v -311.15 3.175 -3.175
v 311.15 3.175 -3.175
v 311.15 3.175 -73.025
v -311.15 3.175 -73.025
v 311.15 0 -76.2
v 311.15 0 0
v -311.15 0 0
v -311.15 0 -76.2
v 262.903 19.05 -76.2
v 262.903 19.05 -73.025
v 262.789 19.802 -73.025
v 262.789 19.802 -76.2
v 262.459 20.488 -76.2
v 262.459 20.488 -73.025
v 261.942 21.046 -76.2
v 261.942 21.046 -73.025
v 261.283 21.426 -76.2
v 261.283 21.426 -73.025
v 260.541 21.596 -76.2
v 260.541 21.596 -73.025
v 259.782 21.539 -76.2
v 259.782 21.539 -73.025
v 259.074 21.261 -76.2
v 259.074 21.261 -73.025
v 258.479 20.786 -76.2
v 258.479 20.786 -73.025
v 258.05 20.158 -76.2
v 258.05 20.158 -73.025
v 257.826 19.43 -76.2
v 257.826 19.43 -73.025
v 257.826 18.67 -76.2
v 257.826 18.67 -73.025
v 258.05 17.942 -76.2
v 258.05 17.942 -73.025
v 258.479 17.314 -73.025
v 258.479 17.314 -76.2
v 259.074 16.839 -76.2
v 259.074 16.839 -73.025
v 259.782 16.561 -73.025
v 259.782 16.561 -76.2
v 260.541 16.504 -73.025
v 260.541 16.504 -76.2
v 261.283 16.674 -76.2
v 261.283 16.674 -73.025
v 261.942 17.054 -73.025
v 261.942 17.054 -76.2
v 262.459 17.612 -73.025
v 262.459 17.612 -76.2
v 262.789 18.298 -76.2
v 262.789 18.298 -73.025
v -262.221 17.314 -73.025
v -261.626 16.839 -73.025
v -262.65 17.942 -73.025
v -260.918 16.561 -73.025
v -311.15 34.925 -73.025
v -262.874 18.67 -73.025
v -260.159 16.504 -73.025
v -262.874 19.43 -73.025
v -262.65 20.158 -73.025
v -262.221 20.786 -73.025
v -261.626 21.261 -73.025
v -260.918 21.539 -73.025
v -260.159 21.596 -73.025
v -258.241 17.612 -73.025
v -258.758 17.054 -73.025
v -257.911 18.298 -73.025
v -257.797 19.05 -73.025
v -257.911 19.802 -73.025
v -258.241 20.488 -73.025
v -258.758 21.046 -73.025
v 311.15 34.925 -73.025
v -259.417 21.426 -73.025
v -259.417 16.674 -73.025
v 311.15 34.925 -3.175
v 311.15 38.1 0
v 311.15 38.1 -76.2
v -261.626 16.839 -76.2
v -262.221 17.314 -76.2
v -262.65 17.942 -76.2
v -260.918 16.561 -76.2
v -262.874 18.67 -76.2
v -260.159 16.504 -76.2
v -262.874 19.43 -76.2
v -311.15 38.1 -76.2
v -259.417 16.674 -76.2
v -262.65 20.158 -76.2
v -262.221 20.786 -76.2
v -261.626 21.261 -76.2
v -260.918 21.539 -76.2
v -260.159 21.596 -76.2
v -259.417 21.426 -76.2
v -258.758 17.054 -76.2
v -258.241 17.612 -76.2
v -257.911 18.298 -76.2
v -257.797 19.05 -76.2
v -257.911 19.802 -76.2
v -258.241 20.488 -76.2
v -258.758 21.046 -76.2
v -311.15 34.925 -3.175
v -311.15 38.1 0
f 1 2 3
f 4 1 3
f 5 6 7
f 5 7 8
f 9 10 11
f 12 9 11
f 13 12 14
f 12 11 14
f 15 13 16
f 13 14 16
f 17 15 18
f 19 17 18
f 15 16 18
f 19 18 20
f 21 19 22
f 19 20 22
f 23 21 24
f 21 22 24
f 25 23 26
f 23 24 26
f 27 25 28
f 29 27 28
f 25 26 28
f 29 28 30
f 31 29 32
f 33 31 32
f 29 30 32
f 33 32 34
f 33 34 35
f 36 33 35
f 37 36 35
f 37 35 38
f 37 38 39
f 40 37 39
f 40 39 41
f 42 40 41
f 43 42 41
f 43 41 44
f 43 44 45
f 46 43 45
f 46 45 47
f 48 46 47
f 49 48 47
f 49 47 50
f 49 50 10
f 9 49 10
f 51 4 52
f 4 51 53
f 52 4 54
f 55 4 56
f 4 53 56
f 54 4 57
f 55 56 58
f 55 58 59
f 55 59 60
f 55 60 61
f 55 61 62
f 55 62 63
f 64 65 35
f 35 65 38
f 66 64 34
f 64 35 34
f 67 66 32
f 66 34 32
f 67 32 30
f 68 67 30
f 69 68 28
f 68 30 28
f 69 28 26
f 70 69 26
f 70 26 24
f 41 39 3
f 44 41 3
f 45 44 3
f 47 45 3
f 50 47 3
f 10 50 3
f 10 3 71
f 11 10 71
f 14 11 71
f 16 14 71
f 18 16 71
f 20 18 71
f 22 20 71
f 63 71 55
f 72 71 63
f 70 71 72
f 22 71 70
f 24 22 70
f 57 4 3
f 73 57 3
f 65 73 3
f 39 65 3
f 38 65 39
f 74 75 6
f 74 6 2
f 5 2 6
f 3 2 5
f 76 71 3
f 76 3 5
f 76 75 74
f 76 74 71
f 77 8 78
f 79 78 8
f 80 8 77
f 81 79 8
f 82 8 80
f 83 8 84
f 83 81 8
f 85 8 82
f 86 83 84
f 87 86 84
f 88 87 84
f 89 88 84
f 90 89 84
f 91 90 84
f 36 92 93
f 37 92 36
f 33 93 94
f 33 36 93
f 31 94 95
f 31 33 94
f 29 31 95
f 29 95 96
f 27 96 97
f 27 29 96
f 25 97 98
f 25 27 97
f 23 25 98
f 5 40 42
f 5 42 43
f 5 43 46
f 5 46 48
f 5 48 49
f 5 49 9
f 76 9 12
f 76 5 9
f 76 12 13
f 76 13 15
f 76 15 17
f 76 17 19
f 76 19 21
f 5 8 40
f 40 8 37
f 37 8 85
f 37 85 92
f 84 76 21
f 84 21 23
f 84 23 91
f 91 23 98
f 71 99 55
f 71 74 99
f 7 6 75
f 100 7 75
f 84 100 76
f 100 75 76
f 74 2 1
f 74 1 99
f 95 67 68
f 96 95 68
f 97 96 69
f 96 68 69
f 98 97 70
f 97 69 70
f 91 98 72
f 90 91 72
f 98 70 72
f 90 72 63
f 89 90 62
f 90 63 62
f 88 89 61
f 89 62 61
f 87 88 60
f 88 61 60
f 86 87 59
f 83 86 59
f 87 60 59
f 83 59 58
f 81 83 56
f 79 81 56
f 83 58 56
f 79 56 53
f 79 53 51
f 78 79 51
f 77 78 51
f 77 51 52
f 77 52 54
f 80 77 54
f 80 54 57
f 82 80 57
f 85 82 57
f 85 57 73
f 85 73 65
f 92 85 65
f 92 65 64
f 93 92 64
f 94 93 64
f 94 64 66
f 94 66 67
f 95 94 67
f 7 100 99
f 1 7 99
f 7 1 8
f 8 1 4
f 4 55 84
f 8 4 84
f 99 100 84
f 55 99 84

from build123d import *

# Parameters (mm, degrees)
SKETCH1_W                   = 76.2
SKETCH1_H                   = 38.1
SKETCH1_W_2                 = 69.85
SKETCH1_H_2                 = 31.75
BOSS_EXTRUDE1_DEPTH         = 311.15
F_1_4_20_TAPPED_HOLE1_D     = 5.1054
F_1_4_20_TAPPED_HOLE1_DEPTH = 3.175


with BuildPart() as part:
    # Sketch1 → Boss-Extrude1 (new body, symmetric)
    with BuildSketch(Plane(origin=(0, 0, 0), x_dir=(0, 0, -1), z_dir=(1, 0, 0))):
        with Locations((38.1, 19.05)):
            Rectangle(SKETCH1_W, SKETCH1_H)
        with Locations((38.1, 19.05)):
            Rectangle(SKETCH1_W_2, SKETCH1_H_2, mode=Mode.SUBTRACT)
    extrude(amount=BOSS_EXTRUDE1_DEPTH, both=True)

    # 1/4-20 Tapped Hole1
    with Locations(Plane(origin=(0, 0, -76.2), x_dir=(-1, 0, 0), z_dir=(0, 0, -1))):
        with Locations((260.35, 19.05), (-260.35, 19.05)):
            Hole(F_1_4_20_TAPPED_HOLE1_D / 2, depth=F_1_4_20_TAPPED_HOLE1_DEPTH)


solid = part.part
